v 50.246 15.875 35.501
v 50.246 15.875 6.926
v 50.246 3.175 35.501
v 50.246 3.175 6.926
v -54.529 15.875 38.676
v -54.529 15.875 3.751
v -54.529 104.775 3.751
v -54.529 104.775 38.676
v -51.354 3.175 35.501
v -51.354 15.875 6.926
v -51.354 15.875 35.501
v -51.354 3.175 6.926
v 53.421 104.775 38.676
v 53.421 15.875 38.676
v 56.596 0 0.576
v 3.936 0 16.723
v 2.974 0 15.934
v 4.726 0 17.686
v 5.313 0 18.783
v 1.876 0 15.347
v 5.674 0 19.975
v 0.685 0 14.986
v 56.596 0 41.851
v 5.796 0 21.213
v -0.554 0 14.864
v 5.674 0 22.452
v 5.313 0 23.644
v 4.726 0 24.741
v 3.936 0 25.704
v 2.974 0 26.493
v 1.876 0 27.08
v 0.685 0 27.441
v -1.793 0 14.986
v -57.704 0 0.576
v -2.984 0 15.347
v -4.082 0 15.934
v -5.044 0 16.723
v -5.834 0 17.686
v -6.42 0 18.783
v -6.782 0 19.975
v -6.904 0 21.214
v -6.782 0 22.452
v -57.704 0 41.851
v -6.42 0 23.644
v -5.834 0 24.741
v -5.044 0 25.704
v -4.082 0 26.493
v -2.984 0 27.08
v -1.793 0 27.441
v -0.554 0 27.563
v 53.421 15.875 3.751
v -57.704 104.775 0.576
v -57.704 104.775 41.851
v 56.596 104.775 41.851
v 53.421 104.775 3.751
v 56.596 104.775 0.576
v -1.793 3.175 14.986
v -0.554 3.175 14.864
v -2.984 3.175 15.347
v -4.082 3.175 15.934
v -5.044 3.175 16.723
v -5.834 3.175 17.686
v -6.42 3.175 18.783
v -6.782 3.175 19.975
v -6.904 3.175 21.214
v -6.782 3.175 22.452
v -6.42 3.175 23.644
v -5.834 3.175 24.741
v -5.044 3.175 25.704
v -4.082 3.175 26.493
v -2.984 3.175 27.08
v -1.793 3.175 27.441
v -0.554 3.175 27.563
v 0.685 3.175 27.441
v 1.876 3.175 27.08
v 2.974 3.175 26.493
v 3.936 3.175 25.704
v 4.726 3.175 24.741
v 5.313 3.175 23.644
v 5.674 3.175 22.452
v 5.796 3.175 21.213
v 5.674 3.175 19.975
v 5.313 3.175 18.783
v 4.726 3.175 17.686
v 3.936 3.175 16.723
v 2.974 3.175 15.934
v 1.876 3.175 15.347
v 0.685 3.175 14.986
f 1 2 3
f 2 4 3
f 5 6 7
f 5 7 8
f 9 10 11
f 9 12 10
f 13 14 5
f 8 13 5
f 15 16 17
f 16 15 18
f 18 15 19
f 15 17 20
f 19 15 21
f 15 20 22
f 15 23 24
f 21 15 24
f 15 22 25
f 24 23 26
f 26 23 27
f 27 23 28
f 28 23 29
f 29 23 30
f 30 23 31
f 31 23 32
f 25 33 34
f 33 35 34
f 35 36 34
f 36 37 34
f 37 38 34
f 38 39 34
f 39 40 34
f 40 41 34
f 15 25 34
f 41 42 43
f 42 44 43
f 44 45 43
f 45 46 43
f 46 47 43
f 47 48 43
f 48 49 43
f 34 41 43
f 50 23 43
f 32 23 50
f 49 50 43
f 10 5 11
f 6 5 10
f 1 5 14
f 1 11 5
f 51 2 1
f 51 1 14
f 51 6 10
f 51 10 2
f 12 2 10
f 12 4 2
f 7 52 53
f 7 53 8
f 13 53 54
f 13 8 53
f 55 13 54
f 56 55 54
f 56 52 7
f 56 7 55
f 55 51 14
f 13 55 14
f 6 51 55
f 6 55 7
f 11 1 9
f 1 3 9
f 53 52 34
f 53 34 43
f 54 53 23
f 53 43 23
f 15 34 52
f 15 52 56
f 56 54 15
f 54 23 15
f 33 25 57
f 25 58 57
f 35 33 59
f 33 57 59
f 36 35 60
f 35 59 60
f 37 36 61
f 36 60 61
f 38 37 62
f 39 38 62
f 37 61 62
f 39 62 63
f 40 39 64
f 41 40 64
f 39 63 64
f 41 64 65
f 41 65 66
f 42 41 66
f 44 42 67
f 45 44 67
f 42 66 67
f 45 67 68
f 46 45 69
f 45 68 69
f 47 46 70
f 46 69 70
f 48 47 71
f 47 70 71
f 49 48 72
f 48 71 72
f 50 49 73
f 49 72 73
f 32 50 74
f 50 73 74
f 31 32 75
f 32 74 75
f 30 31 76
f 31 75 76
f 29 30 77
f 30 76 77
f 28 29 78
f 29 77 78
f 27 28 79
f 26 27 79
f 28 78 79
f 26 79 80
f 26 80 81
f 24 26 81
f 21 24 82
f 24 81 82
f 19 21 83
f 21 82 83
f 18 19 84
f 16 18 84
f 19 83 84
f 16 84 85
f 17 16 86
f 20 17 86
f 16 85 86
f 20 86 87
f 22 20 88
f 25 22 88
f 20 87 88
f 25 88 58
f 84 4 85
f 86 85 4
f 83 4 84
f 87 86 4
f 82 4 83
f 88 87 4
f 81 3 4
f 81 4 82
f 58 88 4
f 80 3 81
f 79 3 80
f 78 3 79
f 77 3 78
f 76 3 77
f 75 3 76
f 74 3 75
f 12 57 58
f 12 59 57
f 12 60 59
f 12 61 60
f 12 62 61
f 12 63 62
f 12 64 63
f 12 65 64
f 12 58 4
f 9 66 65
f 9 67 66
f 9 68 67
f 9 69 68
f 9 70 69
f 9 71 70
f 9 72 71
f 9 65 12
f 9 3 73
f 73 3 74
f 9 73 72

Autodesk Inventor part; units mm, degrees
ref_plane "YZ Plane" through (0, 0, 0) normal (1, 0, 0) x (0, 1, 0)
ref_plane "XZ Plane" through (0, 0, 0) normal (0, 1, 0) x (-1, 0, 0)
ref_plane "XY Plane" through (0, 0, 0) normal (0, 0, 1) x (1, 0, 0)
sketch "Sketch1" plane through (0, 0, 0) normal (0, 1, 0) x (-1, 0, 0)
  line L0 (57.7037, 0.576) -> (-56.5963, 0.576)
  line L1 (-56.5963, 0.576) -> (-56.5963, 41.851)
  line L2 (-56.5963, 41.851) -> (57.7037, 41.851)
  line L3 (57.7037, 41.851) -> (57.7037, 0.576)
  point P0 (0, 0)
  dimension "d0" = 114.3
  dimension "d1" = 41.275
extrude "Extrusion1" add sketch "Sketch1" along normal blind 3.175
sketch "Sketch2" plane through (0, 3.175, 0) normal (0, 1, 0) x (1, 0, 0)
  line L0 (56.5963, -0.576) -> (-57.7037, -0.576) projected
  line L1 (-57.7037, -0.576) -> (56.5963, -0.576)
  line L2 (56.5963, -0.576) -> (56.5963, -3.751)
  line L3 (56.5963, -3.751) -> (-57.7037, -3.751)
  line L4 (-57.7037, -3.751) -> (-57.7037, -0.576)
  point P0 (0, 0)
  dimension "d4" = 3.175
  dimension "d5" = 114.3
extrude "Extrusion2" add sketch "Sketch2" along normal blind 101.6
sketch "Sketch3" plane through (0, 3.175, 0) normal (0, 1, 0) x (1, 0, 0)
  line L0 (-57.7037, -41.851) -> (56.5963, -41.851) projected
  line L1 (-57.7037, -41.851) -> (56.5963, -41.851)
  line L2 (56.5963, -41.851) -> (56.5963, -38.676)
  line L3 (56.5963, -38.676) -> (-57.7037, -38.676)
  line L4 (-57.7037, -38.676) -> (-57.7037, -41.851)
  point P0 (0, 0)
  dimension "d8" = 3.175
  dimension "d9" = 114.3
extrude "Extrusion3" add sketch "Sketch3" along normal blind 101.6
sketch "Sketch4" plane through (0, 3.175, 0) normal (0, 1, 0) x (1, 0, 0)
  line L0 (-57.7037, -3.751) -> (-57.7037, -38.676) projected
  line L1 (-57.7037, -3.751) -> (-54.5287, -3.751)
  line L2 (-54.5287, -3.751) -> (-54.5287, -38.676)
  line L3 (-54.5287, -38.676) -> (-57.7037, -38.676)
  line L4 (-57.7037, -38.676) -> (-57.7037, -3.751)
  point P0 (0, 0)
  dimension "d12" = 3.175
  dimension "d13" = 34.925
extrude "Extrusion4" add sketch "Sketch4" along normal blind 101.6
sketch "Sketch5" plane through (0, 3.175, 0) normal (0, 1, 0) x (1, 0, 0)
  line L0 (-54.5287, -3.751) -> (56.5963, -3.751) projected
  line L1 (56.5963, -3.751) -> (53.4213, -3.751)
  line L2 (53.4213, -3.751) -> (53.4213, -38.676)
  line L3 (53.4213, -38.676) -> (56.5963, -38.676)
  line L4 (56.5963, -38.676) -> (56.5963, -3.751)
  point P0 (0, 0)
  dimension "d16" = 3.175
  dimension "d17" = 34.925
extrude "Extrusion5" add sketch "Sketch5" along normal blind 101.6
sketch "Sketch6" plane through (0, 3.175, 0) normal (0, 1, 0) x (1, 0, 0)
  line L0 (-54.5287, -38.676) -> (-54.5287, -3.751) projected
  line L1 (-54.5287, -3.751) -> (53.4213, -3.751) projected
  line L2 (-54.5287, -3.751) -> (53.4213, -3.751)
  line L3 (53.4213, -3.751) -> (53.4213, -6.926)
  line L4 (53.4213, -6.926) -> (-54.5287, -6.926)
  line L5 (-54.5287, -6.926) -> (-54.5287, -3.751)
  point P0 (0, 0)
  point P1 (-54.5287, -6.926)
  dimension "d20" = 107.95
  dimension "d21" = 3.175
extrude "Extrusion6" add sketch "Sketch6" along normal blind 12.7
sketch "Sketch7" plane through (0, 3.175, 0) normal (0, 1, 0) x (1, 0, 0)
  line L0 (-54.5287, -38.676) -> (53.4213, -38.676) projected
  line L1 (-54.5287, -38.676) -> (53.4213, -38.676)
  line L2 (53.4213, -38.676) -> (53.4213, -35.501)
  line L3 (53.4213, -35.501) -> (-54.5287, -35.501)
  line L4 (-54.5287, -35.501) -> (-54.5287, -38.676)
  point P0 (0, 0)
  dimension "d24" = 3.175
  dimension "d25" = 107.95
extrude "Extrusion7" add sketch "Sketch7" along normal blind 12.7
sketch "Sketch9" plane through (0, 3.175, 0) normal (0, 1, 0) x (1, 0, 0)
  line L0 (-54.5287, -6.926) -> (53.4213, -6.926) projected
  line L1 (-54.5287, -6.926) -> (-51.3537, -6.926)
  line L2 (-51.3537, -6.926) -> (-51.3537, -35.501)
  line L3 (-51.3537, -35.501) -> (-54.5287, -35.501)
  line L4 (-54.5287, -35.501) -> (-54.5287, -6.926)
  point P0 (0, 0)
  dimension "d30" = 3.175
  dimension "d31" = 28.575
extrude "Extrusion8" add sketch "Sketch9" along normal blind 12.7
sketch "Sketch10" plane through (0, 3.175, 0) normal (0, 1, 0) x (1, 0, 0)
  line L0 (53.4213, -3.751) -> (53.4213, -6.926) projected
  line L1 (-54.5287, -6.926) -> (53.4213, -6.926) projected
  line L2 (53.4213, -6.926) -> (50.2463, -6.926)
  line L3 (50.2463, -6.926) -> (50.2463, -35.501)
  line L4 (50.2463, -35.501) -> (53.4213, -35.501)
  line L5 (53.4213, -35.501) -> (53.4213, -6.926)
  point P0 (0, 0)
  point P1 (-51.3537, -6.926)
  dimension "d34" = 3.175
  dimension "d35" = 28.575
extrude "Extrusion9" add sketch "Sketch10" along normal blind 12.7
sketch "Sketch11" plane through (0, 0, 0) normal (0, -1, 0) x (1, 0, 0)
  line L0 (56.5963, 41.851) -> (56.5963, 0.576) projected
  line L1 (56.5963, 41.851) -> (56.5963, 21.2135)
  line L2 (56.5963, 21.2135) -> (-0.5537, 21.2135)
  point P0 (0, 0)
  dimension "d38" = 20.6375
  dimension "d39" = 57.15
hole "Hole1" at (-0.5537, 0, 21.2135) direction (0, 1, 0) diameter 12.7 end through all
properties part number "five_cell_bottom_case"
